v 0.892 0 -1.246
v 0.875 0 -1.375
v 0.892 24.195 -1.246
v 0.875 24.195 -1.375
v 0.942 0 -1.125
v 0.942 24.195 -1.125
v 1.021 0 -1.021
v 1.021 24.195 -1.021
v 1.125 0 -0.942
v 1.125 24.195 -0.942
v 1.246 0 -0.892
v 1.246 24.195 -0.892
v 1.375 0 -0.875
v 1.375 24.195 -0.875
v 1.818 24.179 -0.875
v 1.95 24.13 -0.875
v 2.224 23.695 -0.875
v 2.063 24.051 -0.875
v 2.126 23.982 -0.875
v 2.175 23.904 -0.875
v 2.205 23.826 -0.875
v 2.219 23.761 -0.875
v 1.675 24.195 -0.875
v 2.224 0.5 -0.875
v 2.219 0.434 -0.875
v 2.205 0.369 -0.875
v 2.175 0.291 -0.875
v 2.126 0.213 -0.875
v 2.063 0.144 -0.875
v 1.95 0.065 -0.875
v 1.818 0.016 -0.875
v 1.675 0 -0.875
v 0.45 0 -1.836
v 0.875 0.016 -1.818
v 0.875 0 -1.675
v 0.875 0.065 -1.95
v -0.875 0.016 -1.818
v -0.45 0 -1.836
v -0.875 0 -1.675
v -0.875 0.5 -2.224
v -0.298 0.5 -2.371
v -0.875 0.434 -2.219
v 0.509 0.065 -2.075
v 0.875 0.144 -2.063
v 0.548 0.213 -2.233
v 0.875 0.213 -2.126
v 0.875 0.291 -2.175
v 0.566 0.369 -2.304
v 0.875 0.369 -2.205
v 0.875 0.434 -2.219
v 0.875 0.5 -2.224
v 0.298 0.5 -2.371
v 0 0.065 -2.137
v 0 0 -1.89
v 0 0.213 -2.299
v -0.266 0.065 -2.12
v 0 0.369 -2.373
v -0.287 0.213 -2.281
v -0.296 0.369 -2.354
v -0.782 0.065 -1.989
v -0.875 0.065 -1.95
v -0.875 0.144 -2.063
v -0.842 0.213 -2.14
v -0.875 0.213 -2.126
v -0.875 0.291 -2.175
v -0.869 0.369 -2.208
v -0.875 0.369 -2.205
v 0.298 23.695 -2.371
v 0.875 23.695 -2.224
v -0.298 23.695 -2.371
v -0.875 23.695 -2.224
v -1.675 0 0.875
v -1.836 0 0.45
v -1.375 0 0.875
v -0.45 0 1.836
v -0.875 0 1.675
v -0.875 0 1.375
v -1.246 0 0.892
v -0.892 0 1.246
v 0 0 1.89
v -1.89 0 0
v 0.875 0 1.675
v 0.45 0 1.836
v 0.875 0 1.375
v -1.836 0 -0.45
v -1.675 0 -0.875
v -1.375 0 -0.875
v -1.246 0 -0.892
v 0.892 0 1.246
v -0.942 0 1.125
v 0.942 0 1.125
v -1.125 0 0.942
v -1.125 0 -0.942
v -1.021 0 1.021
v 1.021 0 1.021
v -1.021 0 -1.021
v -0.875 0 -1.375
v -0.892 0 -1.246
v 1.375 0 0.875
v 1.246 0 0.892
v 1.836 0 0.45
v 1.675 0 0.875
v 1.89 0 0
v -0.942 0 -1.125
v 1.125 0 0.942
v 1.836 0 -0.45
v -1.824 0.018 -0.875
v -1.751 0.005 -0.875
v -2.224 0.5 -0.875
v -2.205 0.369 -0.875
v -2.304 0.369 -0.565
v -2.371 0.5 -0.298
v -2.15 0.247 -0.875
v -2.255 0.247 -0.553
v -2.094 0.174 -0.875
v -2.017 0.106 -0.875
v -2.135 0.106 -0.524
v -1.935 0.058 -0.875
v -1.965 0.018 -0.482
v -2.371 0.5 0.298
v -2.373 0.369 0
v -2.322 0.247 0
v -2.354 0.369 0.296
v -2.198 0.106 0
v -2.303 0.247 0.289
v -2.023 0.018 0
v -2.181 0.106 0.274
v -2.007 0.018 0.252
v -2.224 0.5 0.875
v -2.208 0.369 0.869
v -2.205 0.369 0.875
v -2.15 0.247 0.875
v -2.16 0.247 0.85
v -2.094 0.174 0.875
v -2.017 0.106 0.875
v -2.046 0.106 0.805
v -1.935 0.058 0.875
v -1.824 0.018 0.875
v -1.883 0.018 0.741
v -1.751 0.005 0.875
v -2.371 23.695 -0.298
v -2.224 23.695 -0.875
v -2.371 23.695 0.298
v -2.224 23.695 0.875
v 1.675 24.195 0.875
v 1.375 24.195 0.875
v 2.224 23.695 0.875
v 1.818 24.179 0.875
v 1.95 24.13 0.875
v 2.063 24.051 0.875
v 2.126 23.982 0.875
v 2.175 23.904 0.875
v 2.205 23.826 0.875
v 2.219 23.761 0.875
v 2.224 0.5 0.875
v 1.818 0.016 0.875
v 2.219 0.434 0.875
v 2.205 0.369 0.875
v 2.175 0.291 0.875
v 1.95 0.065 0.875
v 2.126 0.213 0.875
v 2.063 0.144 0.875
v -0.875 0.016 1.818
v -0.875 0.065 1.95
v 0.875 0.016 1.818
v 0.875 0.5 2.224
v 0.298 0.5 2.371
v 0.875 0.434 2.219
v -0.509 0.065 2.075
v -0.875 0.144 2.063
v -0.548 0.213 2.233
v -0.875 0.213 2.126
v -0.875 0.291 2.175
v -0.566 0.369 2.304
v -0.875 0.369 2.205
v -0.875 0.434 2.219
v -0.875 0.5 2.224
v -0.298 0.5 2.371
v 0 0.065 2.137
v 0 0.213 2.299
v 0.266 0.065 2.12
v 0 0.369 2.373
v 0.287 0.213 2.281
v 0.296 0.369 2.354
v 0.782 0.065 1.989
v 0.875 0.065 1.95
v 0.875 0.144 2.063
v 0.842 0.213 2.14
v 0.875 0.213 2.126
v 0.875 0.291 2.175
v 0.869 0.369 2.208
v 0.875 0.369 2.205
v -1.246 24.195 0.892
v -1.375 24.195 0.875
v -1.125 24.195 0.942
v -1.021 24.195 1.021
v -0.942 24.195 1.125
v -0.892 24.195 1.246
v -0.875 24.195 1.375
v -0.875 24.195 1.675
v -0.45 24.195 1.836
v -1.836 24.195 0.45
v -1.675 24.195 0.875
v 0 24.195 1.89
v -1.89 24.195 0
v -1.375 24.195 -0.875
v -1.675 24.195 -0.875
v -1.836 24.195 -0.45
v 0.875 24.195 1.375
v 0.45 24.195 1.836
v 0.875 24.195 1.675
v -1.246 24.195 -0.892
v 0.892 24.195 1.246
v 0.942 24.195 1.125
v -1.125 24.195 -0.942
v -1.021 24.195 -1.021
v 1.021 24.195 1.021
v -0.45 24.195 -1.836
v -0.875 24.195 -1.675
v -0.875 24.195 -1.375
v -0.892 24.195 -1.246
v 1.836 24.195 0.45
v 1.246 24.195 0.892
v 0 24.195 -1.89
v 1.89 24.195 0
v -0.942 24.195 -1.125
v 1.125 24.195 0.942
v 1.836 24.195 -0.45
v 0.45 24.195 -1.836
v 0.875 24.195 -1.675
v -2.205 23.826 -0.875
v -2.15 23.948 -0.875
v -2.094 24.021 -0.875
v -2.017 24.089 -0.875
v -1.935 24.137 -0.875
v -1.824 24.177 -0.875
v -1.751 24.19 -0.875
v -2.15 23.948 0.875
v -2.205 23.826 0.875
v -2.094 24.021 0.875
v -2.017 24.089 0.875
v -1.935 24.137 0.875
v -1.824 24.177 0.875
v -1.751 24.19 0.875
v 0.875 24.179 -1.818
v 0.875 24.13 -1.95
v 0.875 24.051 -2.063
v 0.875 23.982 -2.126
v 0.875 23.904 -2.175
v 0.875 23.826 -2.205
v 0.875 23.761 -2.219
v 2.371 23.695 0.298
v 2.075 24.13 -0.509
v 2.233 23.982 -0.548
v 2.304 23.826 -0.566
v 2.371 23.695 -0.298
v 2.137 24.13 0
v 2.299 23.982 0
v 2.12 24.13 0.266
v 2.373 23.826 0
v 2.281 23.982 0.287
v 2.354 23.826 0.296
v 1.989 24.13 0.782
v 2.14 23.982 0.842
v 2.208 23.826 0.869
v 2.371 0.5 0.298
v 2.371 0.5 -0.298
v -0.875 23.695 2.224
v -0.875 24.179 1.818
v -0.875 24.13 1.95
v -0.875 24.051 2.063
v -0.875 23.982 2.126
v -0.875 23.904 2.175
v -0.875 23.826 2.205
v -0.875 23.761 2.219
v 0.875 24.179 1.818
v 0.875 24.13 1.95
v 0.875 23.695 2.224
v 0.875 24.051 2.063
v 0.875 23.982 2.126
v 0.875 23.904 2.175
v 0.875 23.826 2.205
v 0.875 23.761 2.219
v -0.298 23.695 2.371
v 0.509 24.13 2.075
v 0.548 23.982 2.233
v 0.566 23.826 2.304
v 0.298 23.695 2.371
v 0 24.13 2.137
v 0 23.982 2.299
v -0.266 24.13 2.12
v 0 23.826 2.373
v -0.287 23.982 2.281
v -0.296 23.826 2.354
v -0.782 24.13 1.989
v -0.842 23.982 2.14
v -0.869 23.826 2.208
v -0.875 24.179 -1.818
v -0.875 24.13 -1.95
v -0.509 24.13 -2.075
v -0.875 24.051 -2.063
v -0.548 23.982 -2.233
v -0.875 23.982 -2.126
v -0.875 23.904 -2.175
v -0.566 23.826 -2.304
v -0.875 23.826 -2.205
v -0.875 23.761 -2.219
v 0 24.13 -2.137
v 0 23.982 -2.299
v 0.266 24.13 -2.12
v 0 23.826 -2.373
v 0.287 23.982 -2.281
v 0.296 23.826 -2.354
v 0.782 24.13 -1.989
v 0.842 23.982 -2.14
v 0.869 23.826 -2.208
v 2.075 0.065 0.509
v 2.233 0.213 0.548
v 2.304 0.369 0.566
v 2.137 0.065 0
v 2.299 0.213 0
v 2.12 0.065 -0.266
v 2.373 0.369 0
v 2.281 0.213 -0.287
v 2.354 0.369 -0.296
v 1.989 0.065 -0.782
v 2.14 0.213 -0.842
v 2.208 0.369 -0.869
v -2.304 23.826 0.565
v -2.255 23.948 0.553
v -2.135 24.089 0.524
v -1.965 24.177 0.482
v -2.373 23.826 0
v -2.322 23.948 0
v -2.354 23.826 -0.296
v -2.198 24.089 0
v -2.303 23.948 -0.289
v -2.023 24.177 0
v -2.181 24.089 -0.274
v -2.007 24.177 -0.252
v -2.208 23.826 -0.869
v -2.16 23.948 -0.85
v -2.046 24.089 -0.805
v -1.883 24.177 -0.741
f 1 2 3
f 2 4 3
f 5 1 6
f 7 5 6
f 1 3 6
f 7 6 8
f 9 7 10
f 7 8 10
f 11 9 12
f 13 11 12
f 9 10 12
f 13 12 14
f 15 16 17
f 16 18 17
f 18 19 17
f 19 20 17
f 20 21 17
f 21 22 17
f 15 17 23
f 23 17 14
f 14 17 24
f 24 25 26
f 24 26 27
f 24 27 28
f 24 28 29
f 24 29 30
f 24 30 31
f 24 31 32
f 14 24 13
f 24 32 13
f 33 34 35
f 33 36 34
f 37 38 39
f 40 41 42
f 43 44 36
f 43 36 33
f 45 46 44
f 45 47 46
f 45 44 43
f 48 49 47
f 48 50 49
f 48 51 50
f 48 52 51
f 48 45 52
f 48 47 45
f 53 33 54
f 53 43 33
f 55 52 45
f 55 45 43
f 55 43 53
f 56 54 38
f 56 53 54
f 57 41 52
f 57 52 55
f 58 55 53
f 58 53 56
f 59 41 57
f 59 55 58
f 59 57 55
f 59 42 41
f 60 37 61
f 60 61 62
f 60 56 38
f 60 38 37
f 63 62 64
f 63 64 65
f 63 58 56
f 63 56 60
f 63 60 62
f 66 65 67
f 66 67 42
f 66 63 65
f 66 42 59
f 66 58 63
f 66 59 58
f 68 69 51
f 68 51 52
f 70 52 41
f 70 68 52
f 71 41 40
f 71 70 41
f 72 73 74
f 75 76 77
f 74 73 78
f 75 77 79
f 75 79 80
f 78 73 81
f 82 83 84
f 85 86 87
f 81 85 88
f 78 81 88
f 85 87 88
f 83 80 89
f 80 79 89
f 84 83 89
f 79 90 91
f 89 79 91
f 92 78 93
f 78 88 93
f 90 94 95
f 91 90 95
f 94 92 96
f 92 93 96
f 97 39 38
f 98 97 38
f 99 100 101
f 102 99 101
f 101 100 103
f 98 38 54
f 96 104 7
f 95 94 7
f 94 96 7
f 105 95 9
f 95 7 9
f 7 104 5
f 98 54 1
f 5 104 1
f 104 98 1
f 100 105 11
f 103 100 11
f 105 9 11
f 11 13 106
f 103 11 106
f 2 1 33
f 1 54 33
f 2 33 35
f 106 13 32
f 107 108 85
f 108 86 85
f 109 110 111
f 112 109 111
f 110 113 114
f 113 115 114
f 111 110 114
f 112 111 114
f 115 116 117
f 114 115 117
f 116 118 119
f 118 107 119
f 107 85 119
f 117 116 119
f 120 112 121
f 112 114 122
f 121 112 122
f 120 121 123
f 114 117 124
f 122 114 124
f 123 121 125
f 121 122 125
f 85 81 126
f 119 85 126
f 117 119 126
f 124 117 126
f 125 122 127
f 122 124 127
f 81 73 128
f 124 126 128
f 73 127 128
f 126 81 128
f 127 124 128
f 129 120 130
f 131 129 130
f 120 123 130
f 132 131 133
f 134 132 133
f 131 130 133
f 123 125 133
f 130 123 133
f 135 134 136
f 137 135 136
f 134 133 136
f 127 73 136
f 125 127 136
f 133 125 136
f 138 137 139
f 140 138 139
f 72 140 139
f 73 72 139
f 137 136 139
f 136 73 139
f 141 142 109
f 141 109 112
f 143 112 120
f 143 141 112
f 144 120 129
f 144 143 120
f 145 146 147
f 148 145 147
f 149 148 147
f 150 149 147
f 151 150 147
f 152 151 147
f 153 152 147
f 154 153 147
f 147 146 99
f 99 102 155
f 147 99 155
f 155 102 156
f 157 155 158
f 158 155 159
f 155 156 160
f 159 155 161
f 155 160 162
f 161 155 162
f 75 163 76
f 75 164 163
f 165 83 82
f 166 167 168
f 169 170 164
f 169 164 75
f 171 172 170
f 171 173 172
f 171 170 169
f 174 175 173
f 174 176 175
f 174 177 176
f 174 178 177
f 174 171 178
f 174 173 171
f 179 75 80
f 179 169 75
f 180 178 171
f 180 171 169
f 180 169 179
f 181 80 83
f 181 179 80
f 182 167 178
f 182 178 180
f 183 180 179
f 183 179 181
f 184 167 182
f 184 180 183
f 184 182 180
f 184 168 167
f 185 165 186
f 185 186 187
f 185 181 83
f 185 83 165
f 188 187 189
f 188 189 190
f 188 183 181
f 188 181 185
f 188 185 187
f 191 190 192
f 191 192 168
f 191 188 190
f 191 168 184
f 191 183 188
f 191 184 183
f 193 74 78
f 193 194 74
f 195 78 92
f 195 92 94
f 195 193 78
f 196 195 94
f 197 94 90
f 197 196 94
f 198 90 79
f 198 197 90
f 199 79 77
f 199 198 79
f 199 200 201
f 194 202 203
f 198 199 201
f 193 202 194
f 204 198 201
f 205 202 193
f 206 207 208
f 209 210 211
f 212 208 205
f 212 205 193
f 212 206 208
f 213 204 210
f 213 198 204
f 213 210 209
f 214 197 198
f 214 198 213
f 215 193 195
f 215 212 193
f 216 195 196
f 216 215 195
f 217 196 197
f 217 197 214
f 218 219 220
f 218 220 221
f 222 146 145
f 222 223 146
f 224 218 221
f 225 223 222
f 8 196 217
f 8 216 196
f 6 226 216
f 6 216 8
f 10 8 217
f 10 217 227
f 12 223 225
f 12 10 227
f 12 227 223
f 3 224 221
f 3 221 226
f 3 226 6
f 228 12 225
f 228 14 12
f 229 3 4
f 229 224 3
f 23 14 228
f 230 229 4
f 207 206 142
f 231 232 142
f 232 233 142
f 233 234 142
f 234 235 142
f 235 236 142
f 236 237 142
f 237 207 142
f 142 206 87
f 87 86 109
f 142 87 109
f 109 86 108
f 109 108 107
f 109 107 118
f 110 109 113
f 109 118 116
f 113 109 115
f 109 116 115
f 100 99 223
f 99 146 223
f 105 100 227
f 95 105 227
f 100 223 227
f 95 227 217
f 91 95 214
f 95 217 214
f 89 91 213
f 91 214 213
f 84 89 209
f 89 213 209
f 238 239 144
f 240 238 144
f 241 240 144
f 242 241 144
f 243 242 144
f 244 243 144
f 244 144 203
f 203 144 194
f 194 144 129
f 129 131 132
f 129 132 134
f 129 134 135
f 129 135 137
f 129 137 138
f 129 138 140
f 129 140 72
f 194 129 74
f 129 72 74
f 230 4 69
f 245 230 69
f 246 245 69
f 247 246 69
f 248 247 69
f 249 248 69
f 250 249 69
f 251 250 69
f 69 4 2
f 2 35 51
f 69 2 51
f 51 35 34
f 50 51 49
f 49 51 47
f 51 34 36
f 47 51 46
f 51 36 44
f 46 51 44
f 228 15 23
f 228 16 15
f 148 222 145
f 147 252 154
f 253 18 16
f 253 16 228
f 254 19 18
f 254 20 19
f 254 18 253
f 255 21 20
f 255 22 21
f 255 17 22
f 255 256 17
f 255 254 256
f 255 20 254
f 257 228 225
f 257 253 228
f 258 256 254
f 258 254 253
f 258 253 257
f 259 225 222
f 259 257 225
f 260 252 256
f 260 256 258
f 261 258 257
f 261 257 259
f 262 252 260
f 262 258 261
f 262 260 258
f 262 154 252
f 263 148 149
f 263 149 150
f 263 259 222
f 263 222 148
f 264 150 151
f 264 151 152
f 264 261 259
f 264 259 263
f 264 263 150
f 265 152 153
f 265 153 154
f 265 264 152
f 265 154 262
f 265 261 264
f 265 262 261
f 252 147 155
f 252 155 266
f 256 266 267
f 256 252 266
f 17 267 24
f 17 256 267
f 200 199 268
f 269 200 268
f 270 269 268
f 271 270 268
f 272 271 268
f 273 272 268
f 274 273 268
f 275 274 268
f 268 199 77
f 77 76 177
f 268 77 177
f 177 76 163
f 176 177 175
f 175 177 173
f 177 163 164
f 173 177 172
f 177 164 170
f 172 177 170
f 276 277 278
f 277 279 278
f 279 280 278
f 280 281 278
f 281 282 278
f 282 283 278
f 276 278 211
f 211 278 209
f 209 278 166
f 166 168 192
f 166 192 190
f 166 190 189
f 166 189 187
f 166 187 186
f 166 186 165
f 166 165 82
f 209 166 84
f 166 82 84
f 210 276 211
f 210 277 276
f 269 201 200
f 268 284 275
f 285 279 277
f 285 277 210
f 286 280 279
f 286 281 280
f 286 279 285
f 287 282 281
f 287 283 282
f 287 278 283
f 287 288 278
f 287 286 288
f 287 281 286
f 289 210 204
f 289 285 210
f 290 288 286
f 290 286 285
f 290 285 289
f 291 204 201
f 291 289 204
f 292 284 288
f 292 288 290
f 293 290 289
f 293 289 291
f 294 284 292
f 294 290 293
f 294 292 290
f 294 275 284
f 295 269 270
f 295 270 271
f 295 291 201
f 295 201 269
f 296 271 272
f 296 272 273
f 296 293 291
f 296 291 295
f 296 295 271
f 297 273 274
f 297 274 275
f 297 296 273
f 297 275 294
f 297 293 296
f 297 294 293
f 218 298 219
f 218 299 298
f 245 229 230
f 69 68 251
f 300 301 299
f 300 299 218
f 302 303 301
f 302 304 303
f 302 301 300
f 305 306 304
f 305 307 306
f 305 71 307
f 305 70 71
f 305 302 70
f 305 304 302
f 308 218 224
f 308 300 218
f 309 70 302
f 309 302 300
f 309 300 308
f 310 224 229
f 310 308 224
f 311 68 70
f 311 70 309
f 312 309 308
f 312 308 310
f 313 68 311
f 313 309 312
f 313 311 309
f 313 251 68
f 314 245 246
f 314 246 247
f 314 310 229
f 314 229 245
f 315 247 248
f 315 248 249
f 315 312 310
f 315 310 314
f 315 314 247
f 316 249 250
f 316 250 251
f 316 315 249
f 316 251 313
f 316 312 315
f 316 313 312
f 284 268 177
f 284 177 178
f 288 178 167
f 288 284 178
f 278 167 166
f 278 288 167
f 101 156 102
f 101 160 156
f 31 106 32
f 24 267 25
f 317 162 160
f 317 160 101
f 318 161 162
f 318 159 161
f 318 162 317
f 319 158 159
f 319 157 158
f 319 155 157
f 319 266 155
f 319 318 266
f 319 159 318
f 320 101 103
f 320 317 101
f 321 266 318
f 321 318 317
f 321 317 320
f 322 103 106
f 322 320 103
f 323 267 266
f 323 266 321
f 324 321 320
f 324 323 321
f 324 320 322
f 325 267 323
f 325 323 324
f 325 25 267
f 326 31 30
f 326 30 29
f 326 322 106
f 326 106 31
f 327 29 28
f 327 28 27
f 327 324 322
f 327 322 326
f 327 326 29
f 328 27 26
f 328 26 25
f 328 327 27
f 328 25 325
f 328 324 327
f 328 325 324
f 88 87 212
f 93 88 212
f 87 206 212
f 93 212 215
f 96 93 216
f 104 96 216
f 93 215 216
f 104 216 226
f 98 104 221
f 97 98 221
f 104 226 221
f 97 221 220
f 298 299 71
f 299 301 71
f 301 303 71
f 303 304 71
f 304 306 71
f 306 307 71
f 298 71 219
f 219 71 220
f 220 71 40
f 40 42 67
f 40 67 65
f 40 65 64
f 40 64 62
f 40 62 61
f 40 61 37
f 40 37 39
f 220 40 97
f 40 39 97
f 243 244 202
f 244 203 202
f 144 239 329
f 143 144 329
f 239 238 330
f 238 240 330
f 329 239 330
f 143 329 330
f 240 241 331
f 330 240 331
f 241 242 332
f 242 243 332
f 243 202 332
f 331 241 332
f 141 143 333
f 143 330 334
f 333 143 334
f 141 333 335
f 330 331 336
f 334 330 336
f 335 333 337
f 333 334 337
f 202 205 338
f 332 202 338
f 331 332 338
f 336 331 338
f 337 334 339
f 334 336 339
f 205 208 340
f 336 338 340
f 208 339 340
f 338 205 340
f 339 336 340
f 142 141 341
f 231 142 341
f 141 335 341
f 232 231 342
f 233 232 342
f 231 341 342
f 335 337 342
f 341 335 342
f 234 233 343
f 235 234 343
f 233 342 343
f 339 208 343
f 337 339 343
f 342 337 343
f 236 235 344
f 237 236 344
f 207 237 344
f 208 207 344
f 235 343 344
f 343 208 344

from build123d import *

# Parameters (mm, degrees)
SKETCH1_W          = 2.39
SKETCH1_H          = 24.195
CUT_EXTRUDE1_DEPTH = 25.195
CUT_EXTRUDE2_DEPTH = 25.195
CUT_EXTRUDE3_DEPTH = 25.195
CUT_EXTRUDE4_DEPTH = 25.195
FILLET1_R          = 0.5


with BuildPart() as part:
    # Sketch1 → Revolve1 (revolve)
    with BuildSketch(Plane(origin=(0, 0, 0), x_dir=(-1, 0, 0), z_dir=(0, 0, -1))):
        with Locations((-1.195, 12.0975)):
            Rectangle(SKETCH1_W, SKETCH1_H)
    revolve(axis=Axis((0, 0, 0), (0, 1, 0)))

    # Sketch2 → Cut-Extrude1 (cut, through all)
    with BuildSketch(Plane.XZ):
        with BuildLine():
            Line((0.875, 2.22406722), (0.875, 0.875))
            Line((0.875, 0.875), (2.22406722, 0.875))
            ThreePointArc((2.22406722, 0.875), (1.689985207, 1.689985207), (0.875, 2.22406722))
        make_face()
    extrude(amount=-CUT_EXTRUDE1_DEPTH, mode=Mode.SUBTRACT)

    # Sketch3 → Cut-Extrude2 (cut, through all)
    with BuildSketch(Plane.XZ):
        with BuildLine():
            Line((2.22406722, -0.875), (0.875, -0.875))
            Line((0.875, -0.875), (0.875, -2.22406722))
            ThreePointArc((0.875, -2.22406722), (1.689985207, -1.689985207), (2.22406722, -0.875))
        make_face()
    extrude(amount=-CUT_EXTRUDE2_DEPTH, mode=Mode.SUBTRACT)

    # Sketch4 → Cut-Extrude3 (cut, through all)
    with BuildSketch(Plane.XZ):
        with BuildLine():
            Line((-0.875, -2.22406722), (-0.875, -0.875))
            Line((-0.875, -0.875), (-2.22406722, -0.875))
            ThreePointArc((-2.22406722, -0.875), (-1.689985207, -1.689985207), (-0.875, -2.22406722))
        make_face()
    extrude(amount=-CUT_EXTRUDE3_DEPTH, mode=Mode.SUBTRACT)

    # Sketch5 → Cut-Extrude4 (cut, through all)
    with BuildSketch(Plane.XZ):
        with BuildLine():
            Line((-2.22406722, 0.875), (-0.875, 0.875))
            Line((-0.875, 0.875), (-0.875, 2.22406722))
            ThreePointArc((-0.875, 2.22406722), (-1.689985207, 1.689985207), (-2.22406722, 0.875))
        make_face()
    extrude(amount=-CUT_EXTRUDE4_DEPTH, mode=Mode.SUBTRACT)

    # Fillet1
    fillet1_edges = [part.edges().sort_by_distance(p)[0] for p in [
        (2.39, 0, 0),
        (0.875, 12.0975, 0.875),
        (0, 24.195, -2.39),
        (0, 0, -2.39),
        (0.875, 12.0975, -0.875),
        (-2.39, 24.195, 0),
        (-2.39, 0, 0),
        (-0.875, 12.0975, -0.875),
        (0, 24.195, 2.39),
        (0, 0, 2.39),
        (-0.875, 12.0975, 0.875),
        (2.39, 24.195, 0),
    ]]
    fillet(fillet1_edges, radius=FILLET1_R)


solid = part.part
